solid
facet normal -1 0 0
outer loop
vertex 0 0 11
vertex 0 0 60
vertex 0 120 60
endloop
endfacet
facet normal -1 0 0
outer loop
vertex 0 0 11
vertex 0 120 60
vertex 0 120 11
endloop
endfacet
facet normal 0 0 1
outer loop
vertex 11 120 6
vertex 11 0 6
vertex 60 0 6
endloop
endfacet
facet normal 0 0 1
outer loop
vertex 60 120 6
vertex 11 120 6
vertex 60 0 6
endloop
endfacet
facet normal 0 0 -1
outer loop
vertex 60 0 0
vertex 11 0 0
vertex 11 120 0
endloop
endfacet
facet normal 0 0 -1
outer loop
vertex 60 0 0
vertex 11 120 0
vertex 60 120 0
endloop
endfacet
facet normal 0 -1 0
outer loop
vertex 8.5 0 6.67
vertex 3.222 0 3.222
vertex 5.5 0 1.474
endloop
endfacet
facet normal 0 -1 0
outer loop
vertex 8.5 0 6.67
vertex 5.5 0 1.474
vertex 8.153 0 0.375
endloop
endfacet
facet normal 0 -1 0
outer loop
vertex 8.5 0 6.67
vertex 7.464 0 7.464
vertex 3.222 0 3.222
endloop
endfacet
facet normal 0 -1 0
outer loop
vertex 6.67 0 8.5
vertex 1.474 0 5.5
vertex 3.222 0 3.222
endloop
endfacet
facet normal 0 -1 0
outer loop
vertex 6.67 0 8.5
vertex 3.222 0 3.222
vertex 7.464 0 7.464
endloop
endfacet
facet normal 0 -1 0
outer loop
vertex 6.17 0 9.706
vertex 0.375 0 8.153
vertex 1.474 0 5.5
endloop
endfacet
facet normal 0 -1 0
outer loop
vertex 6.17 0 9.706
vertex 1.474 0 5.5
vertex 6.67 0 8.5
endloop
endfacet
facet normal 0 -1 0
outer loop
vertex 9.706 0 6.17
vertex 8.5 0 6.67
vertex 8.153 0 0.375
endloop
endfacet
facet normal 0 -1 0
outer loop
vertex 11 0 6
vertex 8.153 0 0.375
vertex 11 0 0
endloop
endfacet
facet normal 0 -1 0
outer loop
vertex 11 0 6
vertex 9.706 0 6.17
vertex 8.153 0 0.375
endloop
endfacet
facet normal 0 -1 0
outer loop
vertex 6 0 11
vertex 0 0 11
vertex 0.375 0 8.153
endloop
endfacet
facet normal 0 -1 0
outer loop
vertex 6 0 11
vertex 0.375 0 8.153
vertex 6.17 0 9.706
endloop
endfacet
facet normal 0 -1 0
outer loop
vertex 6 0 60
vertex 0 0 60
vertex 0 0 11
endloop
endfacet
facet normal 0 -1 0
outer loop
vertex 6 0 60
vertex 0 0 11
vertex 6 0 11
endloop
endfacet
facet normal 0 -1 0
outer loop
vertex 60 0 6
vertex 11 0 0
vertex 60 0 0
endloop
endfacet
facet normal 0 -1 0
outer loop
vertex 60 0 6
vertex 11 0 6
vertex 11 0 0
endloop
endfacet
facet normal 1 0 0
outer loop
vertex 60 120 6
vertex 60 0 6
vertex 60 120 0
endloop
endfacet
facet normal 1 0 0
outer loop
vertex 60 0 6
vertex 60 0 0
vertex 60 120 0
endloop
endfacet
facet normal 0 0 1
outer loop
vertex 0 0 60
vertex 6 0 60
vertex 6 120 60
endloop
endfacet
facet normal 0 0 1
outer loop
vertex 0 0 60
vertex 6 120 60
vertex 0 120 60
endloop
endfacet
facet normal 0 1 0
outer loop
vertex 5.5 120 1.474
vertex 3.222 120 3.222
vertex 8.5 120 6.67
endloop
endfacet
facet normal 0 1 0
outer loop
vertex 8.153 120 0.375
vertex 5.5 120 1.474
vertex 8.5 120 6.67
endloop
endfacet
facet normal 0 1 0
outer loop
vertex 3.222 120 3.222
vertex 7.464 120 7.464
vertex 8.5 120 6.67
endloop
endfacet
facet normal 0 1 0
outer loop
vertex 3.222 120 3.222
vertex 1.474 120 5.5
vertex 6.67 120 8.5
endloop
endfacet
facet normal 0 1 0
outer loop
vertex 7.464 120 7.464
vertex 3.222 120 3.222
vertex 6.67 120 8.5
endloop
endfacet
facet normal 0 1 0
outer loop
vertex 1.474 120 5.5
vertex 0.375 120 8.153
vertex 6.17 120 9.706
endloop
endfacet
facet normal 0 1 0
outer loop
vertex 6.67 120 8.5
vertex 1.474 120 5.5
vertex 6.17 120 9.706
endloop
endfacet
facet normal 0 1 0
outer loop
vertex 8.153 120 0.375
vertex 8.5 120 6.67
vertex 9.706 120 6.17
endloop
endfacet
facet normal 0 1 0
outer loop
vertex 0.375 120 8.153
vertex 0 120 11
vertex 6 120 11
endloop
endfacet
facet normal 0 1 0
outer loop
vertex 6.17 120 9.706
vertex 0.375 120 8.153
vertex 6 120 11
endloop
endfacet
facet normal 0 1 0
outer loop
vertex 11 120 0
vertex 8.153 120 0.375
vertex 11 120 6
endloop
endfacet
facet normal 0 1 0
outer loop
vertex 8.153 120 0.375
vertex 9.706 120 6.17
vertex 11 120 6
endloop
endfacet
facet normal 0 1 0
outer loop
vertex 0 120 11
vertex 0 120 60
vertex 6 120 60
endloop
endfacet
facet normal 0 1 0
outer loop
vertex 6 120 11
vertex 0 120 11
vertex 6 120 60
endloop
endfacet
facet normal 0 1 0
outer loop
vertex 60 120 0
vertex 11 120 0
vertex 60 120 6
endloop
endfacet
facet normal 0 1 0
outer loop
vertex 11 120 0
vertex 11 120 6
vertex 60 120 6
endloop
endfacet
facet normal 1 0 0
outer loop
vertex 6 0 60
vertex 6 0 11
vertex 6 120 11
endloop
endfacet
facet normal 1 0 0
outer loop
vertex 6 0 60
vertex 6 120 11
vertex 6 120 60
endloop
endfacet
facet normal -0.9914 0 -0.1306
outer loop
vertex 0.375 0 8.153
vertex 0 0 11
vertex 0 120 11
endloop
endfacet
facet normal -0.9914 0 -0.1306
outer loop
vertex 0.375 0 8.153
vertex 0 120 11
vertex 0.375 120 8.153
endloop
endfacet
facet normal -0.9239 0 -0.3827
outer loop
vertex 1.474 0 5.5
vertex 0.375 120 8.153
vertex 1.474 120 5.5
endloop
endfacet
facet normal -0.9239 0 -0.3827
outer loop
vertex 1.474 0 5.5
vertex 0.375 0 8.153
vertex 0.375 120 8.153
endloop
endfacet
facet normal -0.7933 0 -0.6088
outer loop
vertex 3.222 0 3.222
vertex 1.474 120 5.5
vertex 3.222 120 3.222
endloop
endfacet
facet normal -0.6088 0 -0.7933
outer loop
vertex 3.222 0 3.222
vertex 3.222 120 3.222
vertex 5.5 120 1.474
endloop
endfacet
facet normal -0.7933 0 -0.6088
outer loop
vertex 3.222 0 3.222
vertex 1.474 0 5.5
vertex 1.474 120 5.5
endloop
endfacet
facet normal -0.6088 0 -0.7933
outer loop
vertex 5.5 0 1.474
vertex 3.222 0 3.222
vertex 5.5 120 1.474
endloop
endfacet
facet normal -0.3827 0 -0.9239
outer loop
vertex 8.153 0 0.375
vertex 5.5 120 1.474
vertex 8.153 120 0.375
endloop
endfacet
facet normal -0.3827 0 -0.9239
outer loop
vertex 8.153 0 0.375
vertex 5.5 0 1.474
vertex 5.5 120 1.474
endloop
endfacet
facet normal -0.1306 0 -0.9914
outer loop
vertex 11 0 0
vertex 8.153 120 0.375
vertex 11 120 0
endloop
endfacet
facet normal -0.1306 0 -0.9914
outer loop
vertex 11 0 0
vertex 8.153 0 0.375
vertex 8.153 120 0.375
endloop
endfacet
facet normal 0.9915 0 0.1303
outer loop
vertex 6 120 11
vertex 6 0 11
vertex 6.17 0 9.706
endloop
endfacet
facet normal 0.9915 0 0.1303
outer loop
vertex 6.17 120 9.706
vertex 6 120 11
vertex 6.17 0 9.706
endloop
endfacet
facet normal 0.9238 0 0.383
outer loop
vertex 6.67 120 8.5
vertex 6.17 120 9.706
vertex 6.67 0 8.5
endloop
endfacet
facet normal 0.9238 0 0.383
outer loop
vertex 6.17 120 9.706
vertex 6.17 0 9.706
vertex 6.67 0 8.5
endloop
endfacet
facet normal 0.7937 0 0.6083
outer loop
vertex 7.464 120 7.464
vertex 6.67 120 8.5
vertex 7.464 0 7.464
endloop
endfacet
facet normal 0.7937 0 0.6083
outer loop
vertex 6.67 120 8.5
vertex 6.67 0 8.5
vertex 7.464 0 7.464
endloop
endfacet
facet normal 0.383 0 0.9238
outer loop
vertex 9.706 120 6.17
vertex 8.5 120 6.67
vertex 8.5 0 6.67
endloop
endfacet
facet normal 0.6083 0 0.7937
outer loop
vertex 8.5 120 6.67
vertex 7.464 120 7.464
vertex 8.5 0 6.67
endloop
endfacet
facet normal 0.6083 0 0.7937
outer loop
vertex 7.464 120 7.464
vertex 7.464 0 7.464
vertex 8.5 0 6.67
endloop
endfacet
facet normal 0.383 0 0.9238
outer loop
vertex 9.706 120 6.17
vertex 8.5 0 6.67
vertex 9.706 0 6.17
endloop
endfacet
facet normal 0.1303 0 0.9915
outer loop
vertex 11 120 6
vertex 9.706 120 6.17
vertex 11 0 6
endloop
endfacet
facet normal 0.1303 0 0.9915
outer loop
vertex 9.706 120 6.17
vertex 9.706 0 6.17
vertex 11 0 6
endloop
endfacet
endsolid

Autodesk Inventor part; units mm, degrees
ref_plane "YZ Plane" through (0, 0, 0) normal (1, 0, 0) x (0, 1, 0)
ref_plane "XZ Plane" through (0, 0, 0) normal (0, 1, 0) x (-1, 0, 0)
ref_plane "XY Plane" through (0, 0, 0) normal (0, 0, 1) x (1, 0, 0)
sketch "Sketch6" plane through (0, 0, 0) normal (0, 0, 1) x (1, 0, 0)
  line L0 (0, 0) -> (60, 0)
  line L1 (60, 0) -> (60, 120)
  line L2 (60, 120) -> (0, 120)
  line L3 (0, 120) -> (0, 0)
  dimension "d47" = 60
  dimension "d48" = 120
extrude "Plate3" add sketch "Sketch6" along normal blind 6
sketch "Sketch7" plane through (6, 0, 0) normal (-1, 0, 0) x (0, -1, 0)
  line L0 (-120, 0) -> (0, 0)
  line L1 (0, 0) -> (0, 60)
  line L2 (0, 60) -> (-120, 60)
  line L3 (-120, 60) -> (-120, 0)
edge flange "Flange2" height 60 angle 90 thickness 6 bend radius 5 thickness toward (-1, 0, 0) relief round relief width 6 relief depth 3 edges at (0, 60, 6) wall of the first edge with corners at (6, 120, 0) (6, 0, 0) (6, 0, 60) (6, 120, 60)
bend "Bend2"
corner "Corner2"
equation "\"d46\" = Thickness"
equation "\"d49\" = BendReliefWidth"
equation "\"d50\" = BendReliefDepth"
equation "\"d51\" = MinimumRemnant"
equation "\"d52\" = TransitionRadius"
equation "\"d55\" = BendRadius"
equation "\"d56\" = CornerReliefSize"
equation "\"d57\" = GapSize"
equation "\"d58\" = JacobiRadiusSize"
equation "\"BendReliefWidth\" = Thickness"
equation "\"BendReliefDepth\" = 0.5 * Thickness"
equation "\"CornerReliefSize\" = 4 * Thickness"
equation "\"MinimumRemnant\" = 2 * Thickness"
equation "\"TransitionRadius\" = BendRadius"
equation "\"JacobiRadiusSize\" = BendRadius"
equation "\"GapSize\" = Thickness"
equation "\"Thickness\" = 6"
equation "\"BendRadius\" = 5"
properties part number "GnG frame 4.2 reinf" material "Stainless Steel"
